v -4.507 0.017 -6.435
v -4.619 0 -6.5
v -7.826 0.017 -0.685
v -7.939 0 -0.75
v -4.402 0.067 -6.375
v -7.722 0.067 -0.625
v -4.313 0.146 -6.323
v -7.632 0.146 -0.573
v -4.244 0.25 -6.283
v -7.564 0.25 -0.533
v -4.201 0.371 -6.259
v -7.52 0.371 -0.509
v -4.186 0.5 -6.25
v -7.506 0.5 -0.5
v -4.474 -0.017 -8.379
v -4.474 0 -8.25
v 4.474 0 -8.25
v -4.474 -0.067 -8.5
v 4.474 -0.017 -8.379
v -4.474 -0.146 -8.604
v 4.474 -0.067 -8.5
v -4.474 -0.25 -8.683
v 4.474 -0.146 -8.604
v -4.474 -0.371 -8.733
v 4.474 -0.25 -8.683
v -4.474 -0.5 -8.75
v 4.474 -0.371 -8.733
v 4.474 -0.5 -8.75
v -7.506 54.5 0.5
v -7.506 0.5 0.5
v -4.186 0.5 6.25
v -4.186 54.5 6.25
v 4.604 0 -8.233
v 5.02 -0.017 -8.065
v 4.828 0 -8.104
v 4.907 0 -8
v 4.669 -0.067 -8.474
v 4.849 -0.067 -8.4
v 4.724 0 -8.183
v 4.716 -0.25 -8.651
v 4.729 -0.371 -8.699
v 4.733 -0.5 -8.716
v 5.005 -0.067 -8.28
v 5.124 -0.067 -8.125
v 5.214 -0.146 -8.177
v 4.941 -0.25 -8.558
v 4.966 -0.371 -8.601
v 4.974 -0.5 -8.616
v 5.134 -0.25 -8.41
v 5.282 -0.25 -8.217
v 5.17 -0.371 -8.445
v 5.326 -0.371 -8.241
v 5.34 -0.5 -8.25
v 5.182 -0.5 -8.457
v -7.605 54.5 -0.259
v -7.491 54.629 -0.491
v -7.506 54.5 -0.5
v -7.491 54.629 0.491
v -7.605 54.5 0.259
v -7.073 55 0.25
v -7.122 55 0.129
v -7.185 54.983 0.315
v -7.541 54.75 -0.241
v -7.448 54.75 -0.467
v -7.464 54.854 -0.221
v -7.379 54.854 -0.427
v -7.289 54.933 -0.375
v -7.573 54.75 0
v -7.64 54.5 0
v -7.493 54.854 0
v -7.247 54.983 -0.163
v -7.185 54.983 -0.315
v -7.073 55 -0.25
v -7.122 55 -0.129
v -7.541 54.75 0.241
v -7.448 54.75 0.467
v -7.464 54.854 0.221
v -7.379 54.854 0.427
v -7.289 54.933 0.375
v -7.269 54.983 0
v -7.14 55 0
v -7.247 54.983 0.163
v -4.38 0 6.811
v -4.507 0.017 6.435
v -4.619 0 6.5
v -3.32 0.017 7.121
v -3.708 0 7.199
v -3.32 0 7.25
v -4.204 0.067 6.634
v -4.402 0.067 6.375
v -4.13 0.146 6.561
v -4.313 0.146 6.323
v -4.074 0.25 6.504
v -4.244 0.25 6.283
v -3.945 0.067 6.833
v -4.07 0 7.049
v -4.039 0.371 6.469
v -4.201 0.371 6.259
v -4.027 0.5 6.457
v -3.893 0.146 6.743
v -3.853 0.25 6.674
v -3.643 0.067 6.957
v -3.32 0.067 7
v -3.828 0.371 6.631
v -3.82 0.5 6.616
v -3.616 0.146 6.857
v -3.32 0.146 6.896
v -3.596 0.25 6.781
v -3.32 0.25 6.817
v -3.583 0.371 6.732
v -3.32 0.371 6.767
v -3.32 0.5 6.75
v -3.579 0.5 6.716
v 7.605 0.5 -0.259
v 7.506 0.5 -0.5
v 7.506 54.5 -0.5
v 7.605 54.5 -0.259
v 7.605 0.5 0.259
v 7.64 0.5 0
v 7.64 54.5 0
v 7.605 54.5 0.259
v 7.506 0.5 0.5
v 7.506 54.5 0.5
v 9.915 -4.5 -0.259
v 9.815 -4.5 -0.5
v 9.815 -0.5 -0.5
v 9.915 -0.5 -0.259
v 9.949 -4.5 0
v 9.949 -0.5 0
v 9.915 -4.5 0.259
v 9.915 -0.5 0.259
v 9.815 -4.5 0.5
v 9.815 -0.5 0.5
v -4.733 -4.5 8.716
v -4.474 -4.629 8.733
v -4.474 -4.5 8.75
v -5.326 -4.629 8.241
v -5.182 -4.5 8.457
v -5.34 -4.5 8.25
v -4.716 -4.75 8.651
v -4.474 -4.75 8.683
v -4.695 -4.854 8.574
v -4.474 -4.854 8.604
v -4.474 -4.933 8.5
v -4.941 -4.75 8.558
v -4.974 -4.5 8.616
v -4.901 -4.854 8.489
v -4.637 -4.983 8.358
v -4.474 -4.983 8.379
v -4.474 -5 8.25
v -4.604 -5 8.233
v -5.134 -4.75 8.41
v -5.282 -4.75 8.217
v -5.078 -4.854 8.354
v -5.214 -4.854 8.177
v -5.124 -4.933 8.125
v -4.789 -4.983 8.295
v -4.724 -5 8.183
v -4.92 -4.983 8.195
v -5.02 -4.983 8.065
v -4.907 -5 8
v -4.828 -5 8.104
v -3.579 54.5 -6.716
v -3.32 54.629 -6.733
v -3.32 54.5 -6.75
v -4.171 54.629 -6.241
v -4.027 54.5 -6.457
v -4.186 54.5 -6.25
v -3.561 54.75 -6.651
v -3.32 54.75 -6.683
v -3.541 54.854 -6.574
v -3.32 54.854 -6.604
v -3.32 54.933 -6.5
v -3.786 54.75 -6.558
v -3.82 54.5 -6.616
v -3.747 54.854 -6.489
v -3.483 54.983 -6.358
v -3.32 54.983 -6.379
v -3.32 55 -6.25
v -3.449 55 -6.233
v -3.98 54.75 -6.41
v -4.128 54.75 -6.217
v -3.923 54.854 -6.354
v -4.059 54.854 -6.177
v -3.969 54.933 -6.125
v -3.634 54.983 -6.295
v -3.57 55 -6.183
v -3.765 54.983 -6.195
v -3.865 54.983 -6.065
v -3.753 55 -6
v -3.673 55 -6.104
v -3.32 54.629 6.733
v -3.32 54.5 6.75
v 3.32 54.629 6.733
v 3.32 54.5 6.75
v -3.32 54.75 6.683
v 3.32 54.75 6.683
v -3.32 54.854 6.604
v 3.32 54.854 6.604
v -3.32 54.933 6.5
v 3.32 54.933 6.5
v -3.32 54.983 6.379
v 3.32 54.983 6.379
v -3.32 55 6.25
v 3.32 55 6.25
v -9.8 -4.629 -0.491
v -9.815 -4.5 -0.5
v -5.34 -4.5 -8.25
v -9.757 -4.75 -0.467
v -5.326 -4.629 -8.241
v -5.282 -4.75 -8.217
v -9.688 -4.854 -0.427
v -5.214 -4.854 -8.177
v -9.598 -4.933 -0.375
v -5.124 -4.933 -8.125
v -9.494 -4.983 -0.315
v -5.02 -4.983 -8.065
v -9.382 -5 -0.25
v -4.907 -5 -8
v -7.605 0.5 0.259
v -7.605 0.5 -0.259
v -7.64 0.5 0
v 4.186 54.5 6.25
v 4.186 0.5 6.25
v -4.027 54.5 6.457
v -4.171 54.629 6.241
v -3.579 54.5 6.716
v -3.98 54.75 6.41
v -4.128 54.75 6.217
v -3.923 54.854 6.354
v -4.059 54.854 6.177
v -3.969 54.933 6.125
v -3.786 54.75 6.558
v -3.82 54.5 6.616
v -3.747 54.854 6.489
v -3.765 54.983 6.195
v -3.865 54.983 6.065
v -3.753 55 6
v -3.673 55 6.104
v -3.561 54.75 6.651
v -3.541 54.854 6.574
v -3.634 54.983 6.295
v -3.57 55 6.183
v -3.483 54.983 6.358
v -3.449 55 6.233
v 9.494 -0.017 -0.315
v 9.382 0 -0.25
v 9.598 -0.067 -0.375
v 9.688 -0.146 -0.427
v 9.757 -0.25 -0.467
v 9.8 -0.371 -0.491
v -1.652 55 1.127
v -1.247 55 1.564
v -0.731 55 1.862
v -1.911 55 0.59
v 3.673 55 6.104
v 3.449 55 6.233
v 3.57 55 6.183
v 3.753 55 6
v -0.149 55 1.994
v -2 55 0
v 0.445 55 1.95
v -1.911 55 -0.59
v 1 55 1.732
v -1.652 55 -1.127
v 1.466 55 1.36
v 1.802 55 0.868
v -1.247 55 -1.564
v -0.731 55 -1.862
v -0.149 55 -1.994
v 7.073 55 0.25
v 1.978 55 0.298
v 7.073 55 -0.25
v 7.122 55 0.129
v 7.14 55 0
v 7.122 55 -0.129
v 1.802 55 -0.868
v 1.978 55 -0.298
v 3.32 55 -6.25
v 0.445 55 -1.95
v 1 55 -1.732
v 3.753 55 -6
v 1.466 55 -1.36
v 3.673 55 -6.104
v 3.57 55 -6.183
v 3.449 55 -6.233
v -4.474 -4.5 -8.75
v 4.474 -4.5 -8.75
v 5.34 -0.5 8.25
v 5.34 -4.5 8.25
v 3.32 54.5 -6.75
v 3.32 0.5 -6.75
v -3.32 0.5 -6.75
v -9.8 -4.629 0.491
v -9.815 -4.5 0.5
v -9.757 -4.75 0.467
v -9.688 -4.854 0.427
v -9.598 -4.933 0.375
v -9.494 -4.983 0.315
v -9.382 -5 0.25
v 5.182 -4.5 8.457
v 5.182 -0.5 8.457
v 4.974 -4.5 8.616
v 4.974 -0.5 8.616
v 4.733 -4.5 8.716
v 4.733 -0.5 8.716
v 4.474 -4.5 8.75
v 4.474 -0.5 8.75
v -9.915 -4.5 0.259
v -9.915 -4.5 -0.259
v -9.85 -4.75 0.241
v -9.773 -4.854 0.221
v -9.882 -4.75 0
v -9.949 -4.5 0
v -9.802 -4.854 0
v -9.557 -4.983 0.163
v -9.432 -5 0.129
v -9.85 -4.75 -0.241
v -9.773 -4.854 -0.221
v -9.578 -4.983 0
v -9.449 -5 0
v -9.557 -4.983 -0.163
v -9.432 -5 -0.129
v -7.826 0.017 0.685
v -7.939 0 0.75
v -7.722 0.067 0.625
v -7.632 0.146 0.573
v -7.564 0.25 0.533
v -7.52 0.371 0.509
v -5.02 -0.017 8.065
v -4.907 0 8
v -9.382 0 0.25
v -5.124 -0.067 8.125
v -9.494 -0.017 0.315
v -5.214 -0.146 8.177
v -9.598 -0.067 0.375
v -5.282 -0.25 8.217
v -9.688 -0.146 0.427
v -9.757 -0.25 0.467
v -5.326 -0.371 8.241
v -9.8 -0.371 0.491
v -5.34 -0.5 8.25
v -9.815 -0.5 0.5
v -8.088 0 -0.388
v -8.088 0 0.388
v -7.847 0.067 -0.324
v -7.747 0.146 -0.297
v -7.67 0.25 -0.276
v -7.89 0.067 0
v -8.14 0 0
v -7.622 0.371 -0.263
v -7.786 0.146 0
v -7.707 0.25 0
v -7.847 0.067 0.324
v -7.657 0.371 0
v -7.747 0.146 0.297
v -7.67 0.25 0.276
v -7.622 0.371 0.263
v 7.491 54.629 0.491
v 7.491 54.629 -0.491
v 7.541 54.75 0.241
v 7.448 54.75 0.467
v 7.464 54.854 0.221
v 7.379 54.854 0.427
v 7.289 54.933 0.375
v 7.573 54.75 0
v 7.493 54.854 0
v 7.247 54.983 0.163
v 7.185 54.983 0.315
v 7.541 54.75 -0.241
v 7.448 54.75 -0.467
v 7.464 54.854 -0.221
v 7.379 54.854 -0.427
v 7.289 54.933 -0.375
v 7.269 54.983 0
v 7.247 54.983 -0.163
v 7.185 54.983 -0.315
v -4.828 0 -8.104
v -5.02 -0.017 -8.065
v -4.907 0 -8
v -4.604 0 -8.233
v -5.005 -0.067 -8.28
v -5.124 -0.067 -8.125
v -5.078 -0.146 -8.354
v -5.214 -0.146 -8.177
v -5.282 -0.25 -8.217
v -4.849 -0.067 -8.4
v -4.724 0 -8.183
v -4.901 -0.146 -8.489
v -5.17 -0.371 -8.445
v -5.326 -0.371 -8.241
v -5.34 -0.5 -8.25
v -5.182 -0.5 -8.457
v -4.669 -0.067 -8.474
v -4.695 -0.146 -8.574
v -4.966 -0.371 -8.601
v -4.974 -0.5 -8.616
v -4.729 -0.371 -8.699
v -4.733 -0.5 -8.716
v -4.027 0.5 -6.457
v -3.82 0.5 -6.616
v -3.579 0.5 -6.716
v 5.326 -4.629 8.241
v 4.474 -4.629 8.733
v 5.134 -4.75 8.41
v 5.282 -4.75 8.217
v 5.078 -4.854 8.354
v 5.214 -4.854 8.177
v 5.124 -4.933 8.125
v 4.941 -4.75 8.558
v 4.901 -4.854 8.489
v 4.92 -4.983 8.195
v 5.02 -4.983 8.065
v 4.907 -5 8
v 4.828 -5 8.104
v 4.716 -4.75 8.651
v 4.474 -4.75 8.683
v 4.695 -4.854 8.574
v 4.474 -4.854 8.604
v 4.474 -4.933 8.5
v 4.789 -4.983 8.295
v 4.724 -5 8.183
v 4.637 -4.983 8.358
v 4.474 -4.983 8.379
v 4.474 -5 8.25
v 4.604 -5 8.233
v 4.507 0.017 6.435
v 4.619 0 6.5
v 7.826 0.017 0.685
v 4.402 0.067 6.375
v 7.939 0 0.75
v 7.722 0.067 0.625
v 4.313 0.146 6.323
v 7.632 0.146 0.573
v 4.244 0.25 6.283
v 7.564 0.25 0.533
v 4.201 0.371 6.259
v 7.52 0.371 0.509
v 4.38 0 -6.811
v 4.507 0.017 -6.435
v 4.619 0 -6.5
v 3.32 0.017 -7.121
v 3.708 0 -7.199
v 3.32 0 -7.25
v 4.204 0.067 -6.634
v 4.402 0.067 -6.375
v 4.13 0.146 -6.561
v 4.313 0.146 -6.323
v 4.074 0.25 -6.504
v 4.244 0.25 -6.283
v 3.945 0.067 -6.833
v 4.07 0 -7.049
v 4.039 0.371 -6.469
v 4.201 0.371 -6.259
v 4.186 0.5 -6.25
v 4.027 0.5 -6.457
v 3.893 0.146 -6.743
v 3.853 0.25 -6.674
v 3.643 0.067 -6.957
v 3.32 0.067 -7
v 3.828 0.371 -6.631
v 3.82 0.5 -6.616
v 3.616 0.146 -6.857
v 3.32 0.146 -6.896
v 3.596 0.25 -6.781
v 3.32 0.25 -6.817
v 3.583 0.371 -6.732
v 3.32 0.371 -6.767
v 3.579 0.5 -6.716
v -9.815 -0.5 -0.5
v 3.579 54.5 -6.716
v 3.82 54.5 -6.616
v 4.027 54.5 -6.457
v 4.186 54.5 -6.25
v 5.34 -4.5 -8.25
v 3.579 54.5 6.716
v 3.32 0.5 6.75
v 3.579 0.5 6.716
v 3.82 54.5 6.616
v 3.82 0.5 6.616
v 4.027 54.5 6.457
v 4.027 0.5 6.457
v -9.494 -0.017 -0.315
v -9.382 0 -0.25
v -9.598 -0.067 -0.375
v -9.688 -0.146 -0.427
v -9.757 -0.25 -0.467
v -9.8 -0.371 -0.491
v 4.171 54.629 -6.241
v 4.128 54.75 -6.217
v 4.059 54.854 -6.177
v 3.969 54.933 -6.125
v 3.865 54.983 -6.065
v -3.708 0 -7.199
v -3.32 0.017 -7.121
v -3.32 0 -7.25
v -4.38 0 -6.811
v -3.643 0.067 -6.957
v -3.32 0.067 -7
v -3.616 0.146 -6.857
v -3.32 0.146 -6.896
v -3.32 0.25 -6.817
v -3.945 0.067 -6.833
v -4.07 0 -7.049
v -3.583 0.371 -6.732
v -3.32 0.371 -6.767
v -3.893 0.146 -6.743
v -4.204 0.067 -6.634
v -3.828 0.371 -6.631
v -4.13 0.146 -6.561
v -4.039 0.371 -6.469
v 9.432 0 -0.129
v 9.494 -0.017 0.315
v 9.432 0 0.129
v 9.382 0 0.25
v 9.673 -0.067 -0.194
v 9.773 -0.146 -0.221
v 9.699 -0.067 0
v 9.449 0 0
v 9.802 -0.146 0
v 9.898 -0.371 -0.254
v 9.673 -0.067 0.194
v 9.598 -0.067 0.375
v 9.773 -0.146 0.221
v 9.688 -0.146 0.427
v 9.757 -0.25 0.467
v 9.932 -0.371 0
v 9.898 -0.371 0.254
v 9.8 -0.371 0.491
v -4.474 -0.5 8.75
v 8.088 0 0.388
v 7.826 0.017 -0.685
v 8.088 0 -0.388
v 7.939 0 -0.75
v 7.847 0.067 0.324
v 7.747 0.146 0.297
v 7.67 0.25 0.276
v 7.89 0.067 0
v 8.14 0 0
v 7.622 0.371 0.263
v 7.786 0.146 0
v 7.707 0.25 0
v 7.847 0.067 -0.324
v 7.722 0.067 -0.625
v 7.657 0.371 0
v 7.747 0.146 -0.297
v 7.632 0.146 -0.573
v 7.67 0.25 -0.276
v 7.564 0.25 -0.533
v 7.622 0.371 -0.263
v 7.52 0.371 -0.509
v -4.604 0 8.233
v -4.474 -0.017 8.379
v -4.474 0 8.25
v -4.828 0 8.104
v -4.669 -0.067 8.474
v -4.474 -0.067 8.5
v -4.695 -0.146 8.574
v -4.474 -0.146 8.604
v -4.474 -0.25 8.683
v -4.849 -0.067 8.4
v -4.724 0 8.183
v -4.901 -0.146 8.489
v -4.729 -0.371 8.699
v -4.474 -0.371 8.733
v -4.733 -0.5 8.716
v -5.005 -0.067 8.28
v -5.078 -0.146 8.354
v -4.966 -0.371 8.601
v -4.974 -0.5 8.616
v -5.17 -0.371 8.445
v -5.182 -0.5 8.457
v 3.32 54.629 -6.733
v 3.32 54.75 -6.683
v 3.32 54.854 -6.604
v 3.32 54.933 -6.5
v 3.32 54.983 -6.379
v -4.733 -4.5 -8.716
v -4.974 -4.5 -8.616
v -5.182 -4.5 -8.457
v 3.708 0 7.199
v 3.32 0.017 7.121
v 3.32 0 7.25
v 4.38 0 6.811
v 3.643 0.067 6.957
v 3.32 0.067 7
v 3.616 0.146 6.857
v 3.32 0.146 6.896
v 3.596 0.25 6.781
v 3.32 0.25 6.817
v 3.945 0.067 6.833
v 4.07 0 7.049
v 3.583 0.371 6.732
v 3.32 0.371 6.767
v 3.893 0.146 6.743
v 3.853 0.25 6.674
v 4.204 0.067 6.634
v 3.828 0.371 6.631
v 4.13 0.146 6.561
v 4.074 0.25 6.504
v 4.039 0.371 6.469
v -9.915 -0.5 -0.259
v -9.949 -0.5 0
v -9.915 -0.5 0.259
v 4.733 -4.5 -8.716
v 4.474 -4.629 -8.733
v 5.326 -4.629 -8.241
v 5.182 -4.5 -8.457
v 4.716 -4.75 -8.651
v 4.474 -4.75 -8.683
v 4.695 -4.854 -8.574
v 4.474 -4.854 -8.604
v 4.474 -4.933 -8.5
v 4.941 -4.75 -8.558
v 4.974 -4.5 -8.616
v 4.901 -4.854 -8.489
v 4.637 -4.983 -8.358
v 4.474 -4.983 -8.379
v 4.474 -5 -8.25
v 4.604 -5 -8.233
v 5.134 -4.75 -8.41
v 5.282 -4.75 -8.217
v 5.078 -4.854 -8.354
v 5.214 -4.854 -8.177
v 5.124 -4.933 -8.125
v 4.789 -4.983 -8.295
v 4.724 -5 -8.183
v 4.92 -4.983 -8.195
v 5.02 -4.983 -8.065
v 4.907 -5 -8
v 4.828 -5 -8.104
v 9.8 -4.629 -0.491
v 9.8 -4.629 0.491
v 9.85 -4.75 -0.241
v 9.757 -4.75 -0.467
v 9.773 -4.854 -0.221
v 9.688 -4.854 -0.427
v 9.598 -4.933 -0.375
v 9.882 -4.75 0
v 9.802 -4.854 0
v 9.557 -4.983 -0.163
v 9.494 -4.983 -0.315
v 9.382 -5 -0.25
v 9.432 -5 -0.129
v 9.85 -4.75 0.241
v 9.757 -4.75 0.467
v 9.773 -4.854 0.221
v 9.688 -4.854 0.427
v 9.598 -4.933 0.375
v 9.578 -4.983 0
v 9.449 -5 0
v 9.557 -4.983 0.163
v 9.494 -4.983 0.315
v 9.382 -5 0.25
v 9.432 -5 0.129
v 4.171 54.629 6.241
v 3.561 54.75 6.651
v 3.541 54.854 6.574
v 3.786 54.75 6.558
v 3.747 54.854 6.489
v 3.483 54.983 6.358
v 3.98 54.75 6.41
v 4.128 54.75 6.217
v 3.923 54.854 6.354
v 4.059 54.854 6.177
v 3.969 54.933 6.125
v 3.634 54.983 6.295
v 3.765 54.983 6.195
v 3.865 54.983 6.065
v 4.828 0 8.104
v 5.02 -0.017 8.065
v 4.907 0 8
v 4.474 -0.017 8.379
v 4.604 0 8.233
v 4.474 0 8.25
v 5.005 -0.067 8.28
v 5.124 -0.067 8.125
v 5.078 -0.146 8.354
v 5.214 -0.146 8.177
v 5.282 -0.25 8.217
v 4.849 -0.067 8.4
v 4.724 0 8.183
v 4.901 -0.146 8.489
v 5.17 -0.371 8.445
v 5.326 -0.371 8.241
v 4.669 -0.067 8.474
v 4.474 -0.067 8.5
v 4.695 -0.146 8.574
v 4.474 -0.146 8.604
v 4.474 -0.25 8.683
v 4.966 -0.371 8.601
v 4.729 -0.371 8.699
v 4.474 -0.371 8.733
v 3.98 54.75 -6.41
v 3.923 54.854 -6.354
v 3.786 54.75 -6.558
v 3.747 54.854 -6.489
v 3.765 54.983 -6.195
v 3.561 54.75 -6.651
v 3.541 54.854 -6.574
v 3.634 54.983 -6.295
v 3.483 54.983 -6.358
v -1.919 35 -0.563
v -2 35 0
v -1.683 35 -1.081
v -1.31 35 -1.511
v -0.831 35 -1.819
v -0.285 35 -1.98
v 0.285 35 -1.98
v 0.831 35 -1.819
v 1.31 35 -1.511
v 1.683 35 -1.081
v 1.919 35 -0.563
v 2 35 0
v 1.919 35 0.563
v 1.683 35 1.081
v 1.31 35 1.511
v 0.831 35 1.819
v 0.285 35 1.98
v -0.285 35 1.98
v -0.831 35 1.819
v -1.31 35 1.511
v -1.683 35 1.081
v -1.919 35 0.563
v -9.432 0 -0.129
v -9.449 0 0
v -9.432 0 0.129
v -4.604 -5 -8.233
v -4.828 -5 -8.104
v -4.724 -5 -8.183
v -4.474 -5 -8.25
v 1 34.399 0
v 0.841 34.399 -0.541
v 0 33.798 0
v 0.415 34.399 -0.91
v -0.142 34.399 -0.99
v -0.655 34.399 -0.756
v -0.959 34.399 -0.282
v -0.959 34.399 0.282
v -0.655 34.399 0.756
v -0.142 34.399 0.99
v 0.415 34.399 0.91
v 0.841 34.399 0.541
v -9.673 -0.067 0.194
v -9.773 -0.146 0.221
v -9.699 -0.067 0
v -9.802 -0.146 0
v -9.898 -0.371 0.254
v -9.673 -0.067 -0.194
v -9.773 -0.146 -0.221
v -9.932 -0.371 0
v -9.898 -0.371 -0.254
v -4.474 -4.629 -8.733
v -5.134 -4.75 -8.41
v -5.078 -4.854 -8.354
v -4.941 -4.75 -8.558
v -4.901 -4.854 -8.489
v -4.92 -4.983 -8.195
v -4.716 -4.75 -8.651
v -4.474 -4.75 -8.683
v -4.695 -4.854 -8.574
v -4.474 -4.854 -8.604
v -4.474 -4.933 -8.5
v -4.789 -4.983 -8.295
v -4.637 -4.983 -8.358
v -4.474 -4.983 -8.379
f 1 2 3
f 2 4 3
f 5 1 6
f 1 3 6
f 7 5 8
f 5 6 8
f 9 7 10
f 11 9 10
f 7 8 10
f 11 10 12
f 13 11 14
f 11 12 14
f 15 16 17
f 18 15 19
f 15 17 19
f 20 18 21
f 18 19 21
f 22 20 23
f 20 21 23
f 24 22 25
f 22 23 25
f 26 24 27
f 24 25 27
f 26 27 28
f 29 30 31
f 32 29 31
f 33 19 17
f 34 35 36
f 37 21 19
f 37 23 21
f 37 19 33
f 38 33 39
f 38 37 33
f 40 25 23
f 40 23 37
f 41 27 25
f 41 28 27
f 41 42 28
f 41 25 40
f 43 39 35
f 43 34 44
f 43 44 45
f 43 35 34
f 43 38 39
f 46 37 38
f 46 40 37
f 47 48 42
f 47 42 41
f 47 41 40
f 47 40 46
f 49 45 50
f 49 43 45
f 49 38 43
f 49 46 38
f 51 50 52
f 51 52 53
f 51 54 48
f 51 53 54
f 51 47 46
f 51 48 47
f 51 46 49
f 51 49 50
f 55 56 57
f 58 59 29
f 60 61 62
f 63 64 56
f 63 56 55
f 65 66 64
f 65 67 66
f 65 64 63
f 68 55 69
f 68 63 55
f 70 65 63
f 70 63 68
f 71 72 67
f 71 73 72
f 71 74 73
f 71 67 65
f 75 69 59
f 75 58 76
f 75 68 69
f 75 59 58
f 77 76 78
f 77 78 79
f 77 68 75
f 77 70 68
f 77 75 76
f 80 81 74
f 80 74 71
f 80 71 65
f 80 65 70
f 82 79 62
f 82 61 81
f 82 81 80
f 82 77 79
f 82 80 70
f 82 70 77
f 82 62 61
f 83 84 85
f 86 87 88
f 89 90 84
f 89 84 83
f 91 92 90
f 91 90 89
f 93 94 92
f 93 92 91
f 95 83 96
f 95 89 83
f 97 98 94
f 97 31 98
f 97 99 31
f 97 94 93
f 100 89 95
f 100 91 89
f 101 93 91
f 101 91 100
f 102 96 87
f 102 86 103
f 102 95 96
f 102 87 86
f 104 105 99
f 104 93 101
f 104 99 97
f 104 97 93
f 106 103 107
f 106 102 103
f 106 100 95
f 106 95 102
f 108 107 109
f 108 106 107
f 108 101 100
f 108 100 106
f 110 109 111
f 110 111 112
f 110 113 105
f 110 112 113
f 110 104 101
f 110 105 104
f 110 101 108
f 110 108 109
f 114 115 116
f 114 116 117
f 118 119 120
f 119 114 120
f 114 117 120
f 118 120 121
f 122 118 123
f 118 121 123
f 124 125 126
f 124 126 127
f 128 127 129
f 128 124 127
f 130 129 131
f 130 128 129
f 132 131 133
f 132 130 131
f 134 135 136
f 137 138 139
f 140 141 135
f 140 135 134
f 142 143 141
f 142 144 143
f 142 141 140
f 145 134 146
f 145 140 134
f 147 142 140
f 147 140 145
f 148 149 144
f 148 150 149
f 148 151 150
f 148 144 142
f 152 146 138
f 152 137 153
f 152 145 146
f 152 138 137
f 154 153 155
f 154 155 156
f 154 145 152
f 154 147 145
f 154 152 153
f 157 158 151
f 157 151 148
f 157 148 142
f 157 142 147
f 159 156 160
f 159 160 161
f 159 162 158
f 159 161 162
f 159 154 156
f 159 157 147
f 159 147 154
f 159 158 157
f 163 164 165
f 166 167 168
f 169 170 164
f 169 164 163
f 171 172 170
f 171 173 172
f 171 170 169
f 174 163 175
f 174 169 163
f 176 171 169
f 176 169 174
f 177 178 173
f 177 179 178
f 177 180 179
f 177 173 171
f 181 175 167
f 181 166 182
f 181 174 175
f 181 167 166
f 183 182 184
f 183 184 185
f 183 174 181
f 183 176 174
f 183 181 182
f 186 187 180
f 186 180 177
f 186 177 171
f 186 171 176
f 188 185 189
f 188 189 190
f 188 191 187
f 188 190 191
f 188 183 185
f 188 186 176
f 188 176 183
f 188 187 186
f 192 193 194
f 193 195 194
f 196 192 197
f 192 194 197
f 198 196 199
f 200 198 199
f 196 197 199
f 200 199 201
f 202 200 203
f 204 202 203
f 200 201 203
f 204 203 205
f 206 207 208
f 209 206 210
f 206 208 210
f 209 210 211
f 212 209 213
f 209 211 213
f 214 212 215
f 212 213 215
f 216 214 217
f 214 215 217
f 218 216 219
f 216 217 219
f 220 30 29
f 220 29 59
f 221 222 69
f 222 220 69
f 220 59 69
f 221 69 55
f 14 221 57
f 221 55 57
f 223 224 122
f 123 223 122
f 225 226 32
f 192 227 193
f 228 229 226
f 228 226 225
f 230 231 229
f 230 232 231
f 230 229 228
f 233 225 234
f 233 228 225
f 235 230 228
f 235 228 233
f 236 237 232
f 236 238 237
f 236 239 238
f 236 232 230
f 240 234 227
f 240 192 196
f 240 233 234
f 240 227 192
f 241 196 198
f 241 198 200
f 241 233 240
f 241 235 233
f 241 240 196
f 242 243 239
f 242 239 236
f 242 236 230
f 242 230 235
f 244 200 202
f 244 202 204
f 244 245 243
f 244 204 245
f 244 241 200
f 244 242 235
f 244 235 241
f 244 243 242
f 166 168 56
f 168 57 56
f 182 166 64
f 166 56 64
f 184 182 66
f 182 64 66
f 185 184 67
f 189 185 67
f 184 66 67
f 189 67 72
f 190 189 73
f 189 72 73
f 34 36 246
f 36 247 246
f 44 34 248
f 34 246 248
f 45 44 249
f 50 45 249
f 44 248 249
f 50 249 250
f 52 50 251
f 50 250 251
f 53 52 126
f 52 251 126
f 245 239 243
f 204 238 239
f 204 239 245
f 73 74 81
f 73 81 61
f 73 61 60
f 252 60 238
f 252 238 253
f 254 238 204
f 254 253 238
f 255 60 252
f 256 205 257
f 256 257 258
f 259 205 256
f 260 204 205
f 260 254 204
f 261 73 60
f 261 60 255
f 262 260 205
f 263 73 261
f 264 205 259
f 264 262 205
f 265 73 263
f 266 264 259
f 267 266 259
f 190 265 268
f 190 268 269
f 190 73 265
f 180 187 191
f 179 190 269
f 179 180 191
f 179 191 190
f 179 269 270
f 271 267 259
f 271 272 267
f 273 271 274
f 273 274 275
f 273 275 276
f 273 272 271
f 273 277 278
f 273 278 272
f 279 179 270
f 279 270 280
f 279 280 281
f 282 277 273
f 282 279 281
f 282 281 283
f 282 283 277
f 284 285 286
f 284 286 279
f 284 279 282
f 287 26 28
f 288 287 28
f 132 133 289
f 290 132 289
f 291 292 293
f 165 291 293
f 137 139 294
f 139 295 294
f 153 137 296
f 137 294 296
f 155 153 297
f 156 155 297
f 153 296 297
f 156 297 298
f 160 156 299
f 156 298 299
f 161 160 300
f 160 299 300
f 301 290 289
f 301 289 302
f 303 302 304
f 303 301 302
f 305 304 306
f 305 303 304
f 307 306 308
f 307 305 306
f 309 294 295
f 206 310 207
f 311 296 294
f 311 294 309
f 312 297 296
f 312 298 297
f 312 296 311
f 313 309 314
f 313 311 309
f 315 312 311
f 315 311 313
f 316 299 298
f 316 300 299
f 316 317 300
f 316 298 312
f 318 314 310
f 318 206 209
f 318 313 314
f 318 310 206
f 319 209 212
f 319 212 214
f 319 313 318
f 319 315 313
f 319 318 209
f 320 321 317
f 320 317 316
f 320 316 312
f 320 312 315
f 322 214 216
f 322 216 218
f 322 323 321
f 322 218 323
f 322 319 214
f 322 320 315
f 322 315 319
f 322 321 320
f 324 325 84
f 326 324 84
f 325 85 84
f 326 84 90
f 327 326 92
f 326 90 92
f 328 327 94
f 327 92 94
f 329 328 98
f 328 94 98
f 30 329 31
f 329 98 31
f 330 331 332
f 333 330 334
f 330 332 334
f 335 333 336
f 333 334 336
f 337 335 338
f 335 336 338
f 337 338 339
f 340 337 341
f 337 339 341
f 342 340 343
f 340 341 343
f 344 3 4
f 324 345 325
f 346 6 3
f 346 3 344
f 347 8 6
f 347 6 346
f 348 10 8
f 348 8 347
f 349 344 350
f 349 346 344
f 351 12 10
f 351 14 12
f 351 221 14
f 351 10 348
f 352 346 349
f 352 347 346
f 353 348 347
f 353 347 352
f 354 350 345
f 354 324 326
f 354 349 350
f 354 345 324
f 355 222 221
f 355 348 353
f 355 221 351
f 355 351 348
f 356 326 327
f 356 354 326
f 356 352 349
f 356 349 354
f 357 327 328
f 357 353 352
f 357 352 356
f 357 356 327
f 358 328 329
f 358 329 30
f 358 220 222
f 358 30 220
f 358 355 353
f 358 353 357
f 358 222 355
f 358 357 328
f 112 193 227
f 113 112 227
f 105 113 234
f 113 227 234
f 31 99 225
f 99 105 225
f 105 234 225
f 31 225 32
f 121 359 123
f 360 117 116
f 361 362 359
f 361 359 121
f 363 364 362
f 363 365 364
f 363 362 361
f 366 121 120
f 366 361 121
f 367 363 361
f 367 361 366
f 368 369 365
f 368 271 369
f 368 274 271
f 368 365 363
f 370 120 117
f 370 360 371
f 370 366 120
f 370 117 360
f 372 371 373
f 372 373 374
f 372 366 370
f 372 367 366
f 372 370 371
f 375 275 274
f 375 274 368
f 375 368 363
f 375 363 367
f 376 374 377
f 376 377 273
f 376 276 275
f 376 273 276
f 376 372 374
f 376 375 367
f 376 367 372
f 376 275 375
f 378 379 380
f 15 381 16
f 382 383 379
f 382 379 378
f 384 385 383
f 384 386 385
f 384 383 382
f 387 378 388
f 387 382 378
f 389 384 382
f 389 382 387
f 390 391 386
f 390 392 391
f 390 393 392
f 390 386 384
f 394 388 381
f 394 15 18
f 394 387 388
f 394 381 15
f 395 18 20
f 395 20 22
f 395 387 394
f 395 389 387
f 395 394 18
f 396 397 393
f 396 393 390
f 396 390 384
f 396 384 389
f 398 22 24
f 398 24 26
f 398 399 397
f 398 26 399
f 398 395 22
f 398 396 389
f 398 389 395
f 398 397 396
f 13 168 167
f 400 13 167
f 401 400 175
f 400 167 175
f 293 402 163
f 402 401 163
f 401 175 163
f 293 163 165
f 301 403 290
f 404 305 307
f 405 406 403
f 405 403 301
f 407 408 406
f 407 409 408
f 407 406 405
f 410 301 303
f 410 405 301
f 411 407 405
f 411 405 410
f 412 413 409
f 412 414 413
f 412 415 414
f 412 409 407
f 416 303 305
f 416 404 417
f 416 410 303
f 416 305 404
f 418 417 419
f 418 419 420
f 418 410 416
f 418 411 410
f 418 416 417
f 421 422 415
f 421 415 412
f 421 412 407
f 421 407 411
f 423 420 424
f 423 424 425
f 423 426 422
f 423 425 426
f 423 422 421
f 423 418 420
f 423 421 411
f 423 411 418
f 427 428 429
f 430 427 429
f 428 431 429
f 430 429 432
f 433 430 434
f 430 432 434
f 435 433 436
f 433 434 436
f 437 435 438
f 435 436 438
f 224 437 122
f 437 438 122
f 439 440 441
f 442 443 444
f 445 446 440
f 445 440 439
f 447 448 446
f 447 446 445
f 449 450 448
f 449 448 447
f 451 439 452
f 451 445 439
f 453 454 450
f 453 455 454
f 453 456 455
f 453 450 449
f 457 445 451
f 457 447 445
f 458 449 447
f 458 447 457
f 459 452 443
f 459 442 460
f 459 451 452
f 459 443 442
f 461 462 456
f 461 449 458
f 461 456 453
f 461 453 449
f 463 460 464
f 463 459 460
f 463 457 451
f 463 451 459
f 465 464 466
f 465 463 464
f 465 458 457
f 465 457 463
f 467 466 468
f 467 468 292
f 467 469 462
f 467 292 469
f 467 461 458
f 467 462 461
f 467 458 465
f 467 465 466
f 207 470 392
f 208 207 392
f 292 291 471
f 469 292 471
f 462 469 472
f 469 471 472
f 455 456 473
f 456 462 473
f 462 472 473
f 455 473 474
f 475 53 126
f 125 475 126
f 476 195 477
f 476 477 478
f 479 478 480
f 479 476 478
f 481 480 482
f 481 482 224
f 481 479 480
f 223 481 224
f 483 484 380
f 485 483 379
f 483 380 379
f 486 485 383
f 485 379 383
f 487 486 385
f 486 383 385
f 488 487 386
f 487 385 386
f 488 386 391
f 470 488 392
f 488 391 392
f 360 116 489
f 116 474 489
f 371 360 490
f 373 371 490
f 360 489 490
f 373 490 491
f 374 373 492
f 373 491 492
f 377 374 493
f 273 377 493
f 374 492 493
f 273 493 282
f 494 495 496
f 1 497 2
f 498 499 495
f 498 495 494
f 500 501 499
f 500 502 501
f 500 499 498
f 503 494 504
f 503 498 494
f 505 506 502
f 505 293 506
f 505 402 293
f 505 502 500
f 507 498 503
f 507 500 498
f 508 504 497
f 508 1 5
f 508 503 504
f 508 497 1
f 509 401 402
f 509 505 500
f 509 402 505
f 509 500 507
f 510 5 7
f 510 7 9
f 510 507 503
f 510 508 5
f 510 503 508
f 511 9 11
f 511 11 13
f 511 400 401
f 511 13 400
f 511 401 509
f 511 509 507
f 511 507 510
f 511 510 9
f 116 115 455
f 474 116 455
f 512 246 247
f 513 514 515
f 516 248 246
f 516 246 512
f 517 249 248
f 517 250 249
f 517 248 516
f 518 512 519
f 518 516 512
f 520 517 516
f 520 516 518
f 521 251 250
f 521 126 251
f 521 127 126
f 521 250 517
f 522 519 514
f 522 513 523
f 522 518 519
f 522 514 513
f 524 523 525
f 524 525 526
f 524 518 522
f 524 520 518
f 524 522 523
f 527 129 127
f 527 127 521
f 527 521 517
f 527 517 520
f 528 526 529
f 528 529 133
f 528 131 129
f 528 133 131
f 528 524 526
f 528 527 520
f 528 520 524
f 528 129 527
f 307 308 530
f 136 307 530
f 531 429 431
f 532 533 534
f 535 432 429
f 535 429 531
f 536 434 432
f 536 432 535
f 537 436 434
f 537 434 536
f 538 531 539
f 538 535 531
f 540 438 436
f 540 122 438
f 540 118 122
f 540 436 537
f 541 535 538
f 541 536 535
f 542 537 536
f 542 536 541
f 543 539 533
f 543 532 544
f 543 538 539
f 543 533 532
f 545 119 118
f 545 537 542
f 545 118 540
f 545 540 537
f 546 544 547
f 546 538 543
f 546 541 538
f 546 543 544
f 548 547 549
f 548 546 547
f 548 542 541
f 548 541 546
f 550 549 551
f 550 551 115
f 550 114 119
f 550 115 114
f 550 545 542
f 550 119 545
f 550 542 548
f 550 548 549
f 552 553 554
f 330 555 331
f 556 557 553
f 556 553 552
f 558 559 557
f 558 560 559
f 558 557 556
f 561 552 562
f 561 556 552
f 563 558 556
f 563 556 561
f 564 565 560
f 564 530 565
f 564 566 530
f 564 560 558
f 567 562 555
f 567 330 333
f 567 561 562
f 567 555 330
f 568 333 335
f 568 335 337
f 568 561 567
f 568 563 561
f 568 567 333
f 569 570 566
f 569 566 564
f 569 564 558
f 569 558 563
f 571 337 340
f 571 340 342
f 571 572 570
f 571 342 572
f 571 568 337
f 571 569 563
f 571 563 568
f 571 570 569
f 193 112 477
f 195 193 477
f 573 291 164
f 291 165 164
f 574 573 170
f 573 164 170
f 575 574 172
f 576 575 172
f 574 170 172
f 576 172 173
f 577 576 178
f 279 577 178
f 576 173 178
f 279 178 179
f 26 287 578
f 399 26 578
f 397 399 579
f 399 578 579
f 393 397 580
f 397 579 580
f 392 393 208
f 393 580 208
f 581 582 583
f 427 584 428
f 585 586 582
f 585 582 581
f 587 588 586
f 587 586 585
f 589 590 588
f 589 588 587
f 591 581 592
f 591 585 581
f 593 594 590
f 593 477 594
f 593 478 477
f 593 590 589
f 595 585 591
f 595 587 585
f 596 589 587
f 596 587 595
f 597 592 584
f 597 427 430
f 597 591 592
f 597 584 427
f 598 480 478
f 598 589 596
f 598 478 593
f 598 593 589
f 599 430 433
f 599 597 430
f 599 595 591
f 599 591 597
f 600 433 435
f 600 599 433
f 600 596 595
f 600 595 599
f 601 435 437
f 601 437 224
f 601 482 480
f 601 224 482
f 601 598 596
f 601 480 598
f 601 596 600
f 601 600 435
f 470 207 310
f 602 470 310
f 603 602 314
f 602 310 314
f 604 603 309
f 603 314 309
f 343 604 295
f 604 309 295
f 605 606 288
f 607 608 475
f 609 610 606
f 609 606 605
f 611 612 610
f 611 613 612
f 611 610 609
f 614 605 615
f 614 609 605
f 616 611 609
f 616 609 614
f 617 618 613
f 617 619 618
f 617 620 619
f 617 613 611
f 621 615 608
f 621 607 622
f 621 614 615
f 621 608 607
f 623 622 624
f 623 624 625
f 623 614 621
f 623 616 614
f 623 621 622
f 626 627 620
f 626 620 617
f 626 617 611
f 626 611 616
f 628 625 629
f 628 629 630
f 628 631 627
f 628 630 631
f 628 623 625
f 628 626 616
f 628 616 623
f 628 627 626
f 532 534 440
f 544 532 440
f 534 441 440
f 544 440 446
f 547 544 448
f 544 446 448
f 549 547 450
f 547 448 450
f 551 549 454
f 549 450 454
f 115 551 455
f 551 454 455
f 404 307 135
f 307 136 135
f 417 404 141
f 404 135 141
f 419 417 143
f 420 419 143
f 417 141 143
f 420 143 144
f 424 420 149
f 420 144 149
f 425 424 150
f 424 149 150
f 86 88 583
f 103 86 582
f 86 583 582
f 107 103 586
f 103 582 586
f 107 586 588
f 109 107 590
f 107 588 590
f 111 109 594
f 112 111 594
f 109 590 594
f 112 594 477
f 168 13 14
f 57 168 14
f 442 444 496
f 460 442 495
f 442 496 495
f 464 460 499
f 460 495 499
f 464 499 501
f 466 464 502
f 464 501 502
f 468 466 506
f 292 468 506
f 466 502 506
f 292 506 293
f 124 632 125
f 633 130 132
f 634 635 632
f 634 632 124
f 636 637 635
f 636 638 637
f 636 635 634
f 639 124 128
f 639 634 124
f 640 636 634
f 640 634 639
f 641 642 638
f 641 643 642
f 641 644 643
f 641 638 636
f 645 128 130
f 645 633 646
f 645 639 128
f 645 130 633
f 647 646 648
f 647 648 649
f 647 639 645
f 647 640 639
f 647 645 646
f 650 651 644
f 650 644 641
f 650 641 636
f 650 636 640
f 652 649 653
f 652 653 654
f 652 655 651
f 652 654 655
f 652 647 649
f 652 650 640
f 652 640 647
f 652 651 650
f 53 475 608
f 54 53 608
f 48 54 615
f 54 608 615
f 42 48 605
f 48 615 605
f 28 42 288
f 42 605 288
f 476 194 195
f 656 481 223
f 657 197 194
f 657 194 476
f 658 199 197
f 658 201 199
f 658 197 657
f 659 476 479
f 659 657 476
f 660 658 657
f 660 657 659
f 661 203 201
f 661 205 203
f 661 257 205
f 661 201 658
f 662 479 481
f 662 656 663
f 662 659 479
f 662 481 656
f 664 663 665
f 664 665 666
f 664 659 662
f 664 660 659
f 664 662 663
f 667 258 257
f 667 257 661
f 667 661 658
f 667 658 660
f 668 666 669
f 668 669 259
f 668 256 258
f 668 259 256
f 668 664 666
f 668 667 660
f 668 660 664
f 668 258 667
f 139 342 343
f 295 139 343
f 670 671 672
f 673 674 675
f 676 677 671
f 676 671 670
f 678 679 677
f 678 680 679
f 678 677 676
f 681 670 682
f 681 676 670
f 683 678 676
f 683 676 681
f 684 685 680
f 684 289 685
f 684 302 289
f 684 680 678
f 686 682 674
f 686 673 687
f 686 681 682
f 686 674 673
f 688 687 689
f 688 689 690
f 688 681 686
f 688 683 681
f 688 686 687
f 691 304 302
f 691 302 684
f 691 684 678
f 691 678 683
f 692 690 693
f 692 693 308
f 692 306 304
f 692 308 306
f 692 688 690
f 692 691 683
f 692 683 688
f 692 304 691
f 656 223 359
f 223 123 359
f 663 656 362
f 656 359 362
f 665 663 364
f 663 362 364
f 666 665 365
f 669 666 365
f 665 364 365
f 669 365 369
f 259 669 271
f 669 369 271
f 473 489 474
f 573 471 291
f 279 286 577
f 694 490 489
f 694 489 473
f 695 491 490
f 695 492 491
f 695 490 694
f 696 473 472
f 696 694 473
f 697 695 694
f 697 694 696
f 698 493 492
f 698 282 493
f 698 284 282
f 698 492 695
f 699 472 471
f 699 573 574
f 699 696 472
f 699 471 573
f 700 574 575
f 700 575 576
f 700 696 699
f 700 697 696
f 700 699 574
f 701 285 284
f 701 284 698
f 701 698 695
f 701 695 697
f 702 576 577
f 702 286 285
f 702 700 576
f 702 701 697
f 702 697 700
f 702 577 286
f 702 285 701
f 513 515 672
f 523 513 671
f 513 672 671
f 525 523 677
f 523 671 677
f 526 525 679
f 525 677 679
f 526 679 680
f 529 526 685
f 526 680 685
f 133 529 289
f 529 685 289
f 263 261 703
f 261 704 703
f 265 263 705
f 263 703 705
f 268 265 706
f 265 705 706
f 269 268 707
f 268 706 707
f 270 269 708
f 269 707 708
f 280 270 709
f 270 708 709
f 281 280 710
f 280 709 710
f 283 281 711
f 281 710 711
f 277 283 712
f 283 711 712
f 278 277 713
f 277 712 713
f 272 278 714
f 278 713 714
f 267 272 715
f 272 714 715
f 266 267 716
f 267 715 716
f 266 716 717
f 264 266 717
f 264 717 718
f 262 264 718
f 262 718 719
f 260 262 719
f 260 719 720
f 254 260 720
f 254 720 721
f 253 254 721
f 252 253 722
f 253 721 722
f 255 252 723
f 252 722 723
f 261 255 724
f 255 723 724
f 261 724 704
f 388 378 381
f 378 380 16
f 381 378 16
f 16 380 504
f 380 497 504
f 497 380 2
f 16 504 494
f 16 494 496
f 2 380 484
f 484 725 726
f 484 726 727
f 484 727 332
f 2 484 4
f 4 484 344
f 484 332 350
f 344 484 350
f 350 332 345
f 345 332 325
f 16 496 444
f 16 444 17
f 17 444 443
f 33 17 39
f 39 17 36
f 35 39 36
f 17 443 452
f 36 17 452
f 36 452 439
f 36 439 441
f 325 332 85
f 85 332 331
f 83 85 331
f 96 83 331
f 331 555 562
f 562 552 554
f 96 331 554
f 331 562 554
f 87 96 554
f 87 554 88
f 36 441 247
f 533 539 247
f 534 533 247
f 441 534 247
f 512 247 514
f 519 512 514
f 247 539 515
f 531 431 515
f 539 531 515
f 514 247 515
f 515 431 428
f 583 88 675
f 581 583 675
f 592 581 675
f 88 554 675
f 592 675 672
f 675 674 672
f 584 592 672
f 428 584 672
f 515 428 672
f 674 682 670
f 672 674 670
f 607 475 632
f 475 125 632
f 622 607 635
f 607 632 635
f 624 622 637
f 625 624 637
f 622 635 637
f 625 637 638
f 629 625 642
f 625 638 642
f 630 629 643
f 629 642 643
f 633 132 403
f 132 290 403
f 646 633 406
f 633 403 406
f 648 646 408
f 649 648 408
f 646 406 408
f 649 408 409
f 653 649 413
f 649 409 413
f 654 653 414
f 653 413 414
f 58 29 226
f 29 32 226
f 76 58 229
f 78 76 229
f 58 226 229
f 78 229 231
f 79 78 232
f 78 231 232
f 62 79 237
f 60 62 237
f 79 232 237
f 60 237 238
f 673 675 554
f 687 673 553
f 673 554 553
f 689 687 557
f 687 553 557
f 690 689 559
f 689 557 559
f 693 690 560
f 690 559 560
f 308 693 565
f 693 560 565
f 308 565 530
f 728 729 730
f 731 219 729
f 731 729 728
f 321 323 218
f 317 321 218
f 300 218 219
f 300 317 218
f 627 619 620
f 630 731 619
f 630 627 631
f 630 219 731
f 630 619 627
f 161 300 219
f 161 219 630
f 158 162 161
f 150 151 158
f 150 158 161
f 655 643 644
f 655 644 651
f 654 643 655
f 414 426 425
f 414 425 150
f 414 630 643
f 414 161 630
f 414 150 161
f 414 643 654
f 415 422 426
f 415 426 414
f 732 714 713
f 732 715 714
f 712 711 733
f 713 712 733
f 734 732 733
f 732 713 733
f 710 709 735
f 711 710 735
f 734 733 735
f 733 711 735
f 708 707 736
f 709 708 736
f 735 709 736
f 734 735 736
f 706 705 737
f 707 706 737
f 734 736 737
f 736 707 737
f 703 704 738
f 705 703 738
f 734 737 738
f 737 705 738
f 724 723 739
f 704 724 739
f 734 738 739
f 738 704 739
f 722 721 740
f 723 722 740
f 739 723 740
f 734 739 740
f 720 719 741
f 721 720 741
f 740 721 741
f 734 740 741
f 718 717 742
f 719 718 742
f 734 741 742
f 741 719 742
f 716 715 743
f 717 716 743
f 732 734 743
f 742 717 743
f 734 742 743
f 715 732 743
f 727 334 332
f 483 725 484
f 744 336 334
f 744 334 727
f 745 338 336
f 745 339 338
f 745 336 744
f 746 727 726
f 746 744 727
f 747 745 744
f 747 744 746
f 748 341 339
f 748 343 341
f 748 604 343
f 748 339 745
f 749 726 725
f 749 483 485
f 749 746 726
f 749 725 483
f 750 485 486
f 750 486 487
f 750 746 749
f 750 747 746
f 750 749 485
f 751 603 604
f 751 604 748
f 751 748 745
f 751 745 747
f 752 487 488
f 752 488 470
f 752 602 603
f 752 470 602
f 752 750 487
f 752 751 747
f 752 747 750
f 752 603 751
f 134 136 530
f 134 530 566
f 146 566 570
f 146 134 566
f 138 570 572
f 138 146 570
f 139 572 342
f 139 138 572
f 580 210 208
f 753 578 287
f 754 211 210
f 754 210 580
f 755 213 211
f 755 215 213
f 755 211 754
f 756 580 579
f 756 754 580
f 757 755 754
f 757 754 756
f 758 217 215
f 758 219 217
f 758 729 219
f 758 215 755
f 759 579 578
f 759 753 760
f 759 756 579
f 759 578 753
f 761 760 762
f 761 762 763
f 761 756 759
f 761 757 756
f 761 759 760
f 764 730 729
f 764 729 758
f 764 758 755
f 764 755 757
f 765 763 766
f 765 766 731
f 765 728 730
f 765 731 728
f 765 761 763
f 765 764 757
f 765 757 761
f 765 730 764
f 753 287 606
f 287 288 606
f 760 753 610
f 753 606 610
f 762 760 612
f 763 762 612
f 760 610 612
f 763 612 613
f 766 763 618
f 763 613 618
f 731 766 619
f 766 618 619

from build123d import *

# Parameters (mm, degrees)
BOSS_EXTRUDE1_DEPTH       = 55
BOSS_EXTRUDE2_DEPTH       = 5
F_4_0MM_DOWEL_HOLE1_D     = 4
F_4_0MM_DOWEL_HOLE1_DEPTH = 20
F_4_0MM_DOWEL_HOLE1_TIP   = 1.201721238
FILLET3_R                 = 1
FILLET4_R                 = 1
FILLET5_R                 = 0.5
FILLET6_R                 = 0.5


with BuildPart() as part:
    # Sketch1 → Boss-Extrude1 (new body)
    with BuildSketch(Plane(origin=(0, 0, 0), x_dir=(1, 0, 0), z_dir=(0, 1, 0))):
        Polygon((3.897114317, -6.75), (7.794228634, 0), (3.897114317, 6.75), (-3.897114317, 6.75), (-7.794228634, 0), (-3.897114317, -6.75), align=None)
    extrude(amount=BOSS_EXTRUDE1_DEPTH)

    # Sketch2 → Boss-Extrude2 (add)
    with BuildSketch(Plane.XZ):
        Polygon((5.051814855, -8.75), (10.103629711, 0), (5.051814855, 8.75), (-5.051814855, 8.75), (-10.103629711, 0), (-5.051814855, -8.75), align=None)
    extrude(amount=BOSS_EXTRUDE2_DEPTH)

    # Ø4.0mm Dowel Hole1
    with Locations(Plane(origin=(0, 55, 0), x_dir=(1, 0, 0), z_dir=(0, 1, 0))):
        with Locations((0, 0)):
            Hole(F_4_0MM_DOWEL_HOLE1_D / 2, depth=F_4_0MM_DOWEL_HOLE1_DEPTH)
            with Locations((0, 0, -(F_4_0MM_DOWEL_HOLE1_DEPTH + F_4_0MM_DOWEL_HOLE1_TIP / 2))):  # 118° drill point
                Cone(0, F_4_0MM_DOWEL_HOLE1_D / 2, F_4_0MM_DOWEL_HOLE1_TIP, mode=Mode.SUBTRACT)

    # Fillet3
    fillet3_edges = [part.edges().sort_by_distance(p)[0] for p in [
        (-3.897114317, 27.5, 6.75),
        (-7.794228634, 27.5, 0),
        (-3.897114317, 27.5, -6.75),
        (3.897114317, 27.5, -6.75),
        (7.794228634, 27.5, 0),
        (3.897114317, 27.5, 6.75),
    ]]
    fillet(fillet3_edges, radius=FILLET3_R)

    # Fillet4
    fillet4_edges = [part.edges().sort_by_distance(p)[0] for p in [
        (-5.051814855, -2.5, -8.75),
        (5.051814855, -2.5, -8.75),
        (10.103629711, -2.5, 0),
        (5.051814855, -2.5, 8.75),
        (-5.051814855, -2.5, 8.75),
        (-10.103629711, -2.5, 0),
    ]]
    fillet(fillet4_edges, radius=FILLET4_R)

    # Fillet5
    fillet5_edges = [part.edges().sort_by_distance(p)[0] for p in [
        (4.974464586, -5, 8.616025404),
        (9.948929172, -5, 0),
        (4.974464586, -5, -8.616025404),
        (-5.845671476, 0, -3.375),
        (0, 0, -6.75),
        (5.845671476, 0, -3.375),
        (5.845671476, 0, 3.375),
        (0, 0, 6.75),
        (-5.845671476, 0, 3.375),
        (-3.819764048, 0, -6.616025404),
        (3.819764048, 0, -6.616025404),
        (7.639528096, 0, 0),
        (3.819764048, 0, 6.616025404),
        (-3.819764048, 0, 6.616025404),
        (-7.639528096, 0, 0),
        (7.577722283, 0, -4.375),
        (7.577722283, -5, -4.375),
        (0, 0, -8.75),
        (-7.577722283, 0, -4.375),
        (-7.577722283, 0, 4.375),
        (0, 0, 8.75),
        (7.577722283, 0, 4.375),
        (-4.974464586, 0, -8.616025404),
        (-9.948929172, 0, 0),
        (-4.974464586, 0, 8.616025404),
        (4.974464586, 0, 8.616025404),
        (9.948929172, 0, 0),
        (4.974464586, 0, -8.616025404),
        (0, -5, -8.75),
        (7.577722283, -5, 4.375),
        (0, -5, 8.75),
        (-7.577722283, -5, 4.375),
        (-7.577722283, -5, -4.375),
        (-4.974464586, -5, -8.616025404),
        (-9.948929172, -5, 0),
        (-4.974464586, -5, 8.616025404),
    ]]
    fillet(fillet5_edges, radius=FILLET5_R)

    # Fillet6
    fillet6_edges = [part.edges().sort_by_distance(p)[0] for p in [
        (-5.845671476, 55, -3.375),
        (0, 55, -6.75),
        (0, 55, 6.75),
        (5.845671476, 55, 3.375),
        (5.845671476, 55, -3.375),
        (-5.845671476, 55, 3.375),
        (-7.639528096, 55, 0),
        (-3.819764048, 55, 6.616025404),
        (3.819764048, 55, 6.616025404),
        (7.639528096, 55, 0),
        (3.819764048, 55, -6.616025404),
        (-3.819764048, 55, -6.616025404),
    ]]
    fillet(fillet6_edges, radius=FILLET6_R)


solid = part.part
